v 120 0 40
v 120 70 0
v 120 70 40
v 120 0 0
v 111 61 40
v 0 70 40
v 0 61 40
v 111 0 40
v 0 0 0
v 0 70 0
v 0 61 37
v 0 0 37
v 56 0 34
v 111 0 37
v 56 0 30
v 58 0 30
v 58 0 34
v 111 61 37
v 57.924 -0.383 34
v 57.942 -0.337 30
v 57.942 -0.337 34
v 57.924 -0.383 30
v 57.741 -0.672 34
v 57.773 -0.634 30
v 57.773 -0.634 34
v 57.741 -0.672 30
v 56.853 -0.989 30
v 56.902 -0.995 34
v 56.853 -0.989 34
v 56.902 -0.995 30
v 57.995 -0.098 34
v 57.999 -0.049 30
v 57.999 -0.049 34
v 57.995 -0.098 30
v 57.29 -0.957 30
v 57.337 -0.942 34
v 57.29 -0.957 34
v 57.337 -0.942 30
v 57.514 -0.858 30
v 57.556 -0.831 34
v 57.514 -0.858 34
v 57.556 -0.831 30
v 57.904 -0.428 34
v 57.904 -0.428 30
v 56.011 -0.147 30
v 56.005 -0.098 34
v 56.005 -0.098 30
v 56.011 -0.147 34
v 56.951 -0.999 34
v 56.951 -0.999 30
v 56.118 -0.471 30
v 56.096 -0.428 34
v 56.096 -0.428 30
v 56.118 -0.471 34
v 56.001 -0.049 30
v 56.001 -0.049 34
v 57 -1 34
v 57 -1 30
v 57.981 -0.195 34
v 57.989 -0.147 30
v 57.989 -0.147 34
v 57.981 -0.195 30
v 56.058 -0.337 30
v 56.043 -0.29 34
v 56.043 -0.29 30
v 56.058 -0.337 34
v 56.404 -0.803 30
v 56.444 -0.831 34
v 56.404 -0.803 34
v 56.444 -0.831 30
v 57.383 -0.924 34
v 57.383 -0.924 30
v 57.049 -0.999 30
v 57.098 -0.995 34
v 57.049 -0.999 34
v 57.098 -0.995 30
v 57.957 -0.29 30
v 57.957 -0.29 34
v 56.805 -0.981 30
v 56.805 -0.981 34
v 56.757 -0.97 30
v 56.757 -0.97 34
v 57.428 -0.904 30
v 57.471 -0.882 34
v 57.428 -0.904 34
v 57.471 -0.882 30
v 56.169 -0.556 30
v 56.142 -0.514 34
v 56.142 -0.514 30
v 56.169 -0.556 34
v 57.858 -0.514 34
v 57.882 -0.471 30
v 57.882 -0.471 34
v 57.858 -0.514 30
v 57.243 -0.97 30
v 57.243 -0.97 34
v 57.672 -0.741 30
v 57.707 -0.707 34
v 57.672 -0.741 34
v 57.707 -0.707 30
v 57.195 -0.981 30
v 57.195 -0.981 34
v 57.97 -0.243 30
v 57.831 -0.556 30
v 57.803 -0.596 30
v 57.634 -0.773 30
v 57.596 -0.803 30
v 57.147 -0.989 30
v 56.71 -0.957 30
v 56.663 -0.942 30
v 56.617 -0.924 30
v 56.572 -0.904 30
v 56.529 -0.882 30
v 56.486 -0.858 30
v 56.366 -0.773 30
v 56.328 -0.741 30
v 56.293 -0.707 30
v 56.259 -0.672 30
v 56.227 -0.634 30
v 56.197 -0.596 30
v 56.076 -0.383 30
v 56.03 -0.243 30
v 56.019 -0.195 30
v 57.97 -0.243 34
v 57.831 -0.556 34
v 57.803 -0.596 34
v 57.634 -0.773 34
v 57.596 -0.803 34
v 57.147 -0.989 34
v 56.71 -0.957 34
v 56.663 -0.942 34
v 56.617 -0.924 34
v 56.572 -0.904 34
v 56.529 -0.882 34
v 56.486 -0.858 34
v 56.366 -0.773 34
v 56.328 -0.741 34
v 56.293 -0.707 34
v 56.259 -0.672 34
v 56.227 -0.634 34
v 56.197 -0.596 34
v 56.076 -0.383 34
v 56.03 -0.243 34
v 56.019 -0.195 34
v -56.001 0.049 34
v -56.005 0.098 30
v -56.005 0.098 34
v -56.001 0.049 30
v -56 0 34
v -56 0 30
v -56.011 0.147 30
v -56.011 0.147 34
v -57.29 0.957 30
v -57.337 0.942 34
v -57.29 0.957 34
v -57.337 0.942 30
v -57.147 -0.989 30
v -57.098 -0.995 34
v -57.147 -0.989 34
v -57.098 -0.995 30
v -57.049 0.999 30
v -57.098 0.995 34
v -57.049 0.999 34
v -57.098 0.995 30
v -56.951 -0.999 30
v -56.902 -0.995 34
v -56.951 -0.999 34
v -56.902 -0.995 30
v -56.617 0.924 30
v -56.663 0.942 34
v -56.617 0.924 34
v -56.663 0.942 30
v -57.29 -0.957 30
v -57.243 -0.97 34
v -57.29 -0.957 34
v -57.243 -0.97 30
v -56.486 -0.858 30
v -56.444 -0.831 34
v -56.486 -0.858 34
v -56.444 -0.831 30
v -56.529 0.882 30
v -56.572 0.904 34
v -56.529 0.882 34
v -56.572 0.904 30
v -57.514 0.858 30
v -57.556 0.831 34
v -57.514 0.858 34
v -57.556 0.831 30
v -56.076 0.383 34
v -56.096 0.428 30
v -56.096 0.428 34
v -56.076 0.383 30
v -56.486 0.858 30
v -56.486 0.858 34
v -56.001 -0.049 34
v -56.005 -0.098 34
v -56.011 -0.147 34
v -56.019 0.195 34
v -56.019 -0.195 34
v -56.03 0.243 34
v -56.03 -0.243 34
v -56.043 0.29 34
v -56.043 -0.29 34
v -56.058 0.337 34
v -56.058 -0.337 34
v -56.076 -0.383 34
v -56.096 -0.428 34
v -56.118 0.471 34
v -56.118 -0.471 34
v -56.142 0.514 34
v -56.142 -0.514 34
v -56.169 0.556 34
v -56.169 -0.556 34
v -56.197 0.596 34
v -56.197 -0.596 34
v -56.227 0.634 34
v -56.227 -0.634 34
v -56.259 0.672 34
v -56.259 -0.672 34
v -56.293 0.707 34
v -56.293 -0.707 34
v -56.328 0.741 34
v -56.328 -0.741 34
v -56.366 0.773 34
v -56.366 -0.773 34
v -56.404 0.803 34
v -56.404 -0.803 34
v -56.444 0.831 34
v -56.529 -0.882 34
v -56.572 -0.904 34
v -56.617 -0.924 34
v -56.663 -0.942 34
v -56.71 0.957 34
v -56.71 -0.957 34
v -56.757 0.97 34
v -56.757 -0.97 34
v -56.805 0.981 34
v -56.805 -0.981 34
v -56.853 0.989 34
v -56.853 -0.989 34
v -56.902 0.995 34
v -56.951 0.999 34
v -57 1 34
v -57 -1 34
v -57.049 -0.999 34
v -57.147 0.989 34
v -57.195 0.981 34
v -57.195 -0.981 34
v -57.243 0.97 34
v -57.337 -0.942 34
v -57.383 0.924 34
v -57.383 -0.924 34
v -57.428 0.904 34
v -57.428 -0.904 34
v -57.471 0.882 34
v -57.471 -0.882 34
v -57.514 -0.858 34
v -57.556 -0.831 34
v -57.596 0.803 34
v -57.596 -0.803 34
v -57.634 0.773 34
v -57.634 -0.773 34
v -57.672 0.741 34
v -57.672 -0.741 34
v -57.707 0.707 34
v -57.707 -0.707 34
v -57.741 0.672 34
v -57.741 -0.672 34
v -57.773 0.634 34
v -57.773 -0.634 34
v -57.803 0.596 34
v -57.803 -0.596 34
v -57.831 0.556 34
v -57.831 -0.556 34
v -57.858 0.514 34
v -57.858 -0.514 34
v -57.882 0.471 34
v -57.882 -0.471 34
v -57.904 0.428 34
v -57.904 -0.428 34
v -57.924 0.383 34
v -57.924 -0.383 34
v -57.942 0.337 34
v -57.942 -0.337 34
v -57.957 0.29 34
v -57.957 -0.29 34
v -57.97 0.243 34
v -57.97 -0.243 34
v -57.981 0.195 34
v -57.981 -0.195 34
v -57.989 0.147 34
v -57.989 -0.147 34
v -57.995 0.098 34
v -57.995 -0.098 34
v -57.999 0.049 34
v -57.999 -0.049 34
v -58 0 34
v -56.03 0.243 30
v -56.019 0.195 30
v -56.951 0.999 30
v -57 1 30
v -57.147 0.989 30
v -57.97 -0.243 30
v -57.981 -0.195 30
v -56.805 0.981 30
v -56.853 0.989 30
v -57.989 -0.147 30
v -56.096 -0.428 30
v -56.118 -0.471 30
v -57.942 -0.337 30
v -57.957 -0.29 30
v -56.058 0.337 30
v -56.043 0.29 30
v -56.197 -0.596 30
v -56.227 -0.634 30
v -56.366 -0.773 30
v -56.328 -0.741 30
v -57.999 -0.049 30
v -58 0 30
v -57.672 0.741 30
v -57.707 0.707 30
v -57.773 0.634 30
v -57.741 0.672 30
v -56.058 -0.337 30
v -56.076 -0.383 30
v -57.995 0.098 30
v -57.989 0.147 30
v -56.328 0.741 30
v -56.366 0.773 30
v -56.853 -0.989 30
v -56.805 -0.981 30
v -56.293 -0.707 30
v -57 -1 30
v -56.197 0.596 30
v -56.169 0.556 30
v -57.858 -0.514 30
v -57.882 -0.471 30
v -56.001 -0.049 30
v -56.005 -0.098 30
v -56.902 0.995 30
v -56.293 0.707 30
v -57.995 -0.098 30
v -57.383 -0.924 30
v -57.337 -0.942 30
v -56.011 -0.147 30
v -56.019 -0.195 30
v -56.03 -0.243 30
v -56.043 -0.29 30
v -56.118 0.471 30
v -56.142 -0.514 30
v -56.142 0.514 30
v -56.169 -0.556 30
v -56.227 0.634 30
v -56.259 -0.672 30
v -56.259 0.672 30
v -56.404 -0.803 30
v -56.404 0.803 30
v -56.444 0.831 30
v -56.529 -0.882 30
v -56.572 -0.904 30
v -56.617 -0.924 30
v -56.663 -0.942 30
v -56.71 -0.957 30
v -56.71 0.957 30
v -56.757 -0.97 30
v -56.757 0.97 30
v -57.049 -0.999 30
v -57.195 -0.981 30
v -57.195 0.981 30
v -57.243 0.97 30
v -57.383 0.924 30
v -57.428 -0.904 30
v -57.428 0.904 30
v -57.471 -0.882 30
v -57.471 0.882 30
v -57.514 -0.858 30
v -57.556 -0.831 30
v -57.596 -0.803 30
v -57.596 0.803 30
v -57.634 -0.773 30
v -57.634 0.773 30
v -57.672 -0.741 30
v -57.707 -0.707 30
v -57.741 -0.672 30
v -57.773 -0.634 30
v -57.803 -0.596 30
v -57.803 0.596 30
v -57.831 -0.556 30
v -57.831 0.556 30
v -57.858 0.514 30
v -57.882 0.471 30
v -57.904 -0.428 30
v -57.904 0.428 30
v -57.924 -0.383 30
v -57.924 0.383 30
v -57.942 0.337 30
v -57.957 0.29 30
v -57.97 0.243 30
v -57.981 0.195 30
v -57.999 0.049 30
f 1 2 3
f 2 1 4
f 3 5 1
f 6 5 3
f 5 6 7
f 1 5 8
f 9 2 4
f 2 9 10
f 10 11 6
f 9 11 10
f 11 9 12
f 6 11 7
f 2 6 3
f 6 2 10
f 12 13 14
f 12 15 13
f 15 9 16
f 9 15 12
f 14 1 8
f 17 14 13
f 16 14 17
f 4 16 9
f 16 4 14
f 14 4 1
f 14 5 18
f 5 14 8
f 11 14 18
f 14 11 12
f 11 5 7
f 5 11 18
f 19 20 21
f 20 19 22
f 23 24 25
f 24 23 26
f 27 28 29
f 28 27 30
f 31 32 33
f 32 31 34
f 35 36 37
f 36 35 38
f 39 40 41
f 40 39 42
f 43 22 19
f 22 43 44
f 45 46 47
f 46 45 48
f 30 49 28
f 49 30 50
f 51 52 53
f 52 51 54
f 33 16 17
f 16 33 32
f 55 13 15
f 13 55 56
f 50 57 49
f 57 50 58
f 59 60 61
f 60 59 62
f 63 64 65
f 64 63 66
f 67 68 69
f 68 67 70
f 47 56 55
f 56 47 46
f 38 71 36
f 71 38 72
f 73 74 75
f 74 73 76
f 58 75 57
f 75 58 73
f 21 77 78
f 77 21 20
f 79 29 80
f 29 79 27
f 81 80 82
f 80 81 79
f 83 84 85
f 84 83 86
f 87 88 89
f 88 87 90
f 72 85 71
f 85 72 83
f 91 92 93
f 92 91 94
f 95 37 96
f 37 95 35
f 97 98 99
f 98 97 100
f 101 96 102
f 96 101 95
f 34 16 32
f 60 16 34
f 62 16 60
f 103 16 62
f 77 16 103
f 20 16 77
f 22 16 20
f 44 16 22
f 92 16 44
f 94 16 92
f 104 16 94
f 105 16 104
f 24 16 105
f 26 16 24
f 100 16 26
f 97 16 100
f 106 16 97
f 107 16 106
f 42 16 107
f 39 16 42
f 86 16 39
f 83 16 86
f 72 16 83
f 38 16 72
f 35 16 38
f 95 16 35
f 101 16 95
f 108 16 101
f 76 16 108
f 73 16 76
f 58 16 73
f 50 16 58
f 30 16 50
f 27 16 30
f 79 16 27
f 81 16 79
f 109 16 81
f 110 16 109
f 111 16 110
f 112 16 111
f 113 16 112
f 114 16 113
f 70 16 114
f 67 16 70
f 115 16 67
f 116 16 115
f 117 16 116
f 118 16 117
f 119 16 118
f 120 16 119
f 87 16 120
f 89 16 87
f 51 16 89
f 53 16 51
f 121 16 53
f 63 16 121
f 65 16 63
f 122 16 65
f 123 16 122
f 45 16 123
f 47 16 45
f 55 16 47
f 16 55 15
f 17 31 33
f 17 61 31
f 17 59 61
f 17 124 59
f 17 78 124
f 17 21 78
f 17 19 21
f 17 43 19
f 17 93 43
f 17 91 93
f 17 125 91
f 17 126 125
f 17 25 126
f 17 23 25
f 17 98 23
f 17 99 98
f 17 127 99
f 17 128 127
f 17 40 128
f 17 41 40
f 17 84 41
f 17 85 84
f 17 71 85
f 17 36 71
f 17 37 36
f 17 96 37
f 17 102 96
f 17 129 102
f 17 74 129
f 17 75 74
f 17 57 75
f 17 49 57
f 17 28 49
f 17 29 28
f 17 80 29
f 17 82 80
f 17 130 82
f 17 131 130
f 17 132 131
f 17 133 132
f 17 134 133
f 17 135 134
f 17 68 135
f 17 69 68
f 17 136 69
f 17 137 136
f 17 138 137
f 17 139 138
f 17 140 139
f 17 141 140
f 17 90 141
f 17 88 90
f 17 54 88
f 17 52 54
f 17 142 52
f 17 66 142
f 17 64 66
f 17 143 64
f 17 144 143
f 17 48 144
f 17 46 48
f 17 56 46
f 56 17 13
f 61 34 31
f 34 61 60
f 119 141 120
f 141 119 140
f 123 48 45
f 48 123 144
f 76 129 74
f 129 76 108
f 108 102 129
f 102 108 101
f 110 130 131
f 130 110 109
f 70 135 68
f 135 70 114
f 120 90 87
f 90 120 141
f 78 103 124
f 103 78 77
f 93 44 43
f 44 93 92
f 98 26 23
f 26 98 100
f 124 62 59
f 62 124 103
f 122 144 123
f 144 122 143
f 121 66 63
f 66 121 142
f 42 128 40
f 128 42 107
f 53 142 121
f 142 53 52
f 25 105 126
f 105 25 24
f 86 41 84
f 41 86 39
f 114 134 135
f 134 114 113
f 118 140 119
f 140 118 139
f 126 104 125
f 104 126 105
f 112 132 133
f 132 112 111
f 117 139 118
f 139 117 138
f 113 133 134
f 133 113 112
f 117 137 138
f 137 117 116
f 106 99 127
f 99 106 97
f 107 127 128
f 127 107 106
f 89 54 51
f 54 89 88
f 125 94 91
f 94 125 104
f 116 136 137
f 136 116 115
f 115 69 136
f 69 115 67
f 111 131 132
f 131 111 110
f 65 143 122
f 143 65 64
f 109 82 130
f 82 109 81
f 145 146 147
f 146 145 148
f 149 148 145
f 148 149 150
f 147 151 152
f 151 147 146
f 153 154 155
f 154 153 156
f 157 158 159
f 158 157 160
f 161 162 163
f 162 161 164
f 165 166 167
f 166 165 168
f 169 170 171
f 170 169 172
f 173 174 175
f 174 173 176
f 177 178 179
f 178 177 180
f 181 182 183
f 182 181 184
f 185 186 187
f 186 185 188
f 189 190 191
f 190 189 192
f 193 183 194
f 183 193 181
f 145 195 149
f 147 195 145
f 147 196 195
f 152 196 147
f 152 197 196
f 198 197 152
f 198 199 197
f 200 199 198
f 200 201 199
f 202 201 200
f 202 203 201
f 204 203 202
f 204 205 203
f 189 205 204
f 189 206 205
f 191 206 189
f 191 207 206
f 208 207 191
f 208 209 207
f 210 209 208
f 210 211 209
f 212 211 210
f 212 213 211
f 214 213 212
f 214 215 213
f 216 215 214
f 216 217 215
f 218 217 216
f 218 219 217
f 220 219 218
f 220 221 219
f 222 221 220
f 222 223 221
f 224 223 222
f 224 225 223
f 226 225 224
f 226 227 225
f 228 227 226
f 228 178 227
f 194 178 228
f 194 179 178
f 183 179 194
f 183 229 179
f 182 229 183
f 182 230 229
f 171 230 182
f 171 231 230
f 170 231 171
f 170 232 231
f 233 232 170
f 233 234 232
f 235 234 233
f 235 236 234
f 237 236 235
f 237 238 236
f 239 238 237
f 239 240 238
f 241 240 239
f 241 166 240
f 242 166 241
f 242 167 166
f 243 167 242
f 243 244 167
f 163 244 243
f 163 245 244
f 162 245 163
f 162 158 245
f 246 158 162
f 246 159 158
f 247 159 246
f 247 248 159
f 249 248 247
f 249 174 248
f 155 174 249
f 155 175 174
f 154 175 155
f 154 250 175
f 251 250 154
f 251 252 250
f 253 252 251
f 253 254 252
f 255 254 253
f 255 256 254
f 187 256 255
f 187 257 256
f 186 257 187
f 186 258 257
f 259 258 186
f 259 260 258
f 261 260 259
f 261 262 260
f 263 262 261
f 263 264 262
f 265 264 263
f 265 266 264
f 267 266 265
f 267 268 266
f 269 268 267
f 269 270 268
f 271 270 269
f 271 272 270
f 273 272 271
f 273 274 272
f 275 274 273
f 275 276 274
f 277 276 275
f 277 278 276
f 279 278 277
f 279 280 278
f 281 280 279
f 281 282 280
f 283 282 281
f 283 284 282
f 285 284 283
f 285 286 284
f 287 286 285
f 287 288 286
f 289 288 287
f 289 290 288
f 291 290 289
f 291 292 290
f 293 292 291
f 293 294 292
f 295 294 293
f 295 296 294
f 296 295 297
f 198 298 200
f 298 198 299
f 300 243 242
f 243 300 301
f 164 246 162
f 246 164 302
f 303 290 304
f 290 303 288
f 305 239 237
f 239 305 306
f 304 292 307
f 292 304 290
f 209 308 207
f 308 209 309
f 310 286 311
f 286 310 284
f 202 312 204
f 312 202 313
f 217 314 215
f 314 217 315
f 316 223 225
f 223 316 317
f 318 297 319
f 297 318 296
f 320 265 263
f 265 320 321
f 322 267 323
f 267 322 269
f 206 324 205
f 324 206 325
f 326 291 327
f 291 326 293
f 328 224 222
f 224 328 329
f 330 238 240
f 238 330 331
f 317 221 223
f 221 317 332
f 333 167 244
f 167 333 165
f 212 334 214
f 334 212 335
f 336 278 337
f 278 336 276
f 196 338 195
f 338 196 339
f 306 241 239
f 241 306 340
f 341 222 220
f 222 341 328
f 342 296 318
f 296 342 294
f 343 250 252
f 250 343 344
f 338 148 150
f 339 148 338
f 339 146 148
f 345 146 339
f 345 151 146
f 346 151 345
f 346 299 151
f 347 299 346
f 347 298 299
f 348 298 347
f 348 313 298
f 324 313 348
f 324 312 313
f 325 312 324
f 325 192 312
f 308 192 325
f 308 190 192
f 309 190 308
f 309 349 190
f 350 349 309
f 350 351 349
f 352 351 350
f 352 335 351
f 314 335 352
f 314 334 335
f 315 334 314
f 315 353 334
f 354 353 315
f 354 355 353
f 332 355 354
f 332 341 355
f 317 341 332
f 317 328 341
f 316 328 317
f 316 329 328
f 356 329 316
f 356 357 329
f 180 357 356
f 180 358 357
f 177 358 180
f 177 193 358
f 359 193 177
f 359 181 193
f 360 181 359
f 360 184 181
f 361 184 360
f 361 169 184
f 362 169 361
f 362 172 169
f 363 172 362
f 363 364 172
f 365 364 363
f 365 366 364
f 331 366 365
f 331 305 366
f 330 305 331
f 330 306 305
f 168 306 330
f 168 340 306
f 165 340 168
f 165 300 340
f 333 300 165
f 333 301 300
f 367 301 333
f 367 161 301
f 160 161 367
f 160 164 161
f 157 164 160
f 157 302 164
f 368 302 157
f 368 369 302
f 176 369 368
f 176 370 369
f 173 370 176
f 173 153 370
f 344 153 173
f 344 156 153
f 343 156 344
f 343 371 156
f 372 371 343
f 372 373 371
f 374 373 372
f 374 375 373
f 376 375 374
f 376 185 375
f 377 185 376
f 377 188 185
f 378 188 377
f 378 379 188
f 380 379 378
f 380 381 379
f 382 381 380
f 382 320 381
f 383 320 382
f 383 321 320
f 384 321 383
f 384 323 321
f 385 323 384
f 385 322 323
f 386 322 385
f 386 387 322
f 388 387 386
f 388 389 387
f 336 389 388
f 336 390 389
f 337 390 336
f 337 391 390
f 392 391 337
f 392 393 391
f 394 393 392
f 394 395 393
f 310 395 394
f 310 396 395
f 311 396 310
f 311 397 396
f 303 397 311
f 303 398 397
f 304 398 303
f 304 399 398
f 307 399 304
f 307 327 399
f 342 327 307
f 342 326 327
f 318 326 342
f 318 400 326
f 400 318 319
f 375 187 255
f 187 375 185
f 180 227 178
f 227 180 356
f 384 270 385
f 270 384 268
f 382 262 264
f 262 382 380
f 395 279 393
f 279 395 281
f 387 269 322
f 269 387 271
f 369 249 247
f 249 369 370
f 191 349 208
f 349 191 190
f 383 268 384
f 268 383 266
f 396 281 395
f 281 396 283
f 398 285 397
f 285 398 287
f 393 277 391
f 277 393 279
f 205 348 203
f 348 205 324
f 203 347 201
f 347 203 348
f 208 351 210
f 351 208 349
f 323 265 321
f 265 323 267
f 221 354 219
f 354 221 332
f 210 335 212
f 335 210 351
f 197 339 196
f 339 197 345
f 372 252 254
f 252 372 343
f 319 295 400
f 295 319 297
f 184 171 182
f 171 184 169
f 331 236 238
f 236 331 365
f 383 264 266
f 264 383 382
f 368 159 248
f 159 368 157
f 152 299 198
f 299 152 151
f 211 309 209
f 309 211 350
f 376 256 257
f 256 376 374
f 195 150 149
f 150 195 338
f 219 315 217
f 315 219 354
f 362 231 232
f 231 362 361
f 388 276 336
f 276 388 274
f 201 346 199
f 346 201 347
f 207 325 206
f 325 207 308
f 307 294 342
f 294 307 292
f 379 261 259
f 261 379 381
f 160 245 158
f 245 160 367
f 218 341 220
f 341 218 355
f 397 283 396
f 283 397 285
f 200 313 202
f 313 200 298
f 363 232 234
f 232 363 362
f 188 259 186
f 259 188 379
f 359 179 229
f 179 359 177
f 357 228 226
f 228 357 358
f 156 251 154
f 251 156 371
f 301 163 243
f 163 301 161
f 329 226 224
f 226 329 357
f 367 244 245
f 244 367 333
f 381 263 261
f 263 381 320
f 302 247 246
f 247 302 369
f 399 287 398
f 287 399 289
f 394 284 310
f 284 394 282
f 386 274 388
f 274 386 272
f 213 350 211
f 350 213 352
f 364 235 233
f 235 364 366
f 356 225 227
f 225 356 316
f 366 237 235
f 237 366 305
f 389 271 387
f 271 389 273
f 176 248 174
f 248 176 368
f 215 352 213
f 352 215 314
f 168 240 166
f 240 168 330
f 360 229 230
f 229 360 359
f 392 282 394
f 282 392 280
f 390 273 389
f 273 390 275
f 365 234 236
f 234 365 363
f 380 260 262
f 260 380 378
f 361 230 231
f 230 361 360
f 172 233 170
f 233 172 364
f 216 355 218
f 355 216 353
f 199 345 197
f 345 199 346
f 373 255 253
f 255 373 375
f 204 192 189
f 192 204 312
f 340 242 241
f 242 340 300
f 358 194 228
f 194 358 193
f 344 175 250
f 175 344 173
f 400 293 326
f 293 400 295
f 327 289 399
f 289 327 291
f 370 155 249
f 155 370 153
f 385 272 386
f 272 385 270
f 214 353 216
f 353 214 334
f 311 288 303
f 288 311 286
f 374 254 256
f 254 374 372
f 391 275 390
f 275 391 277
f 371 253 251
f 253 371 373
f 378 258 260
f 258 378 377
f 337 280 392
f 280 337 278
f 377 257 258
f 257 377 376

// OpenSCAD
// Buffer Tank for Mini Horizontal Gel Electrophoresis
// Units: millimetres

// Outer Dimensions (Specified)
$w_outer = 120; // Width (X)
$d_outer = 70;  // Depth (Y)
$h_outer = 40;  // Height (Z)

// Wall and Floor Thickness
$wall_thick = 3;
$floor_thick = 3;

// Platform Dimensions
$plat_len = 60;   // Length in X
$plat_height = 13; // Height from bed to reach Z=13 (10mm above inner floor at Z=3)

// Hole Dimensions
$hole_dia = 2;
$hole_y = 0;
$hole_z = 30;

// Configuration
$fn = 128; // High resolution for smooth curves

// Derived Dimensions
$w_inner = $w_outer - 2*$wall_thick;
$d_inner = $d_outer - 2*$wall_thick;
$h_inner = $h_outer - $floor_thick;

// Main Tank Body (Open Top)
// Constructed by taking a solid block and subtracting the top opening.
// The tank rests on the bed at Z=0.
difference() {
    // 1. Solid Block (Outer Dimensions)
    cube([
        $w_outer, 
        $d_outer, 
        $h_outer
    ]);
    
    // 2. Cut out the top opening
    // The opening is the inner dimensions.
    // It starts at the top of the tank (h_outer) and goes down to the top of the floor (floor_thick).
    translate([
        -$wall_thick, 
        -$wall_thick, 
        $h_outer - $floor_thick
    ])
    cube([
        $w_inner, 
        $d_inner, 
        $floor_thick
    ]);
}

// Platform (Raised in the middle)
// Positioned relative to the tank body.
// It sits on the bed (Z=0) and is 13mm high.
// Top of platform is at Z=13.
translate([
    0, // Centered in X (will be shifted by parent group if needed, but here we center the tank first)
    0, // Centered in Y
    0  // Base on bed
])
cube([
    $plat_len, 
    $d_outer, // Spans full outer width to match tank walls
    $plat_height
]);

// Electrode Holes
// Drilled through the end walls (X ends) at specific Y and Z
// We use a loop to create two holes (left and right ends)
// The tank is centered at X=0, so ends are at X = +/- ($w_outer/2 - $wall_thick)
$hole_offset_x = ($w_outer / 2) - $wall_thick;

for (side = [1, -1]) {
    translate([
        side * $hole_offset_x,
        $hole_y,
        $hole_z
    ])
    difference() {
        // Create a cylinder that extends slightly past the wall thickness to ensure clean cut
        // Wall thickness is 3mm. We extend 0.5mm past each side.
        $cyl_len = $wall_thick + 1; 
        
        cylinder(
            h = $cyl_len,
            r = $hole_dia / 2,
            $fn = $fn
        );
    }
}
